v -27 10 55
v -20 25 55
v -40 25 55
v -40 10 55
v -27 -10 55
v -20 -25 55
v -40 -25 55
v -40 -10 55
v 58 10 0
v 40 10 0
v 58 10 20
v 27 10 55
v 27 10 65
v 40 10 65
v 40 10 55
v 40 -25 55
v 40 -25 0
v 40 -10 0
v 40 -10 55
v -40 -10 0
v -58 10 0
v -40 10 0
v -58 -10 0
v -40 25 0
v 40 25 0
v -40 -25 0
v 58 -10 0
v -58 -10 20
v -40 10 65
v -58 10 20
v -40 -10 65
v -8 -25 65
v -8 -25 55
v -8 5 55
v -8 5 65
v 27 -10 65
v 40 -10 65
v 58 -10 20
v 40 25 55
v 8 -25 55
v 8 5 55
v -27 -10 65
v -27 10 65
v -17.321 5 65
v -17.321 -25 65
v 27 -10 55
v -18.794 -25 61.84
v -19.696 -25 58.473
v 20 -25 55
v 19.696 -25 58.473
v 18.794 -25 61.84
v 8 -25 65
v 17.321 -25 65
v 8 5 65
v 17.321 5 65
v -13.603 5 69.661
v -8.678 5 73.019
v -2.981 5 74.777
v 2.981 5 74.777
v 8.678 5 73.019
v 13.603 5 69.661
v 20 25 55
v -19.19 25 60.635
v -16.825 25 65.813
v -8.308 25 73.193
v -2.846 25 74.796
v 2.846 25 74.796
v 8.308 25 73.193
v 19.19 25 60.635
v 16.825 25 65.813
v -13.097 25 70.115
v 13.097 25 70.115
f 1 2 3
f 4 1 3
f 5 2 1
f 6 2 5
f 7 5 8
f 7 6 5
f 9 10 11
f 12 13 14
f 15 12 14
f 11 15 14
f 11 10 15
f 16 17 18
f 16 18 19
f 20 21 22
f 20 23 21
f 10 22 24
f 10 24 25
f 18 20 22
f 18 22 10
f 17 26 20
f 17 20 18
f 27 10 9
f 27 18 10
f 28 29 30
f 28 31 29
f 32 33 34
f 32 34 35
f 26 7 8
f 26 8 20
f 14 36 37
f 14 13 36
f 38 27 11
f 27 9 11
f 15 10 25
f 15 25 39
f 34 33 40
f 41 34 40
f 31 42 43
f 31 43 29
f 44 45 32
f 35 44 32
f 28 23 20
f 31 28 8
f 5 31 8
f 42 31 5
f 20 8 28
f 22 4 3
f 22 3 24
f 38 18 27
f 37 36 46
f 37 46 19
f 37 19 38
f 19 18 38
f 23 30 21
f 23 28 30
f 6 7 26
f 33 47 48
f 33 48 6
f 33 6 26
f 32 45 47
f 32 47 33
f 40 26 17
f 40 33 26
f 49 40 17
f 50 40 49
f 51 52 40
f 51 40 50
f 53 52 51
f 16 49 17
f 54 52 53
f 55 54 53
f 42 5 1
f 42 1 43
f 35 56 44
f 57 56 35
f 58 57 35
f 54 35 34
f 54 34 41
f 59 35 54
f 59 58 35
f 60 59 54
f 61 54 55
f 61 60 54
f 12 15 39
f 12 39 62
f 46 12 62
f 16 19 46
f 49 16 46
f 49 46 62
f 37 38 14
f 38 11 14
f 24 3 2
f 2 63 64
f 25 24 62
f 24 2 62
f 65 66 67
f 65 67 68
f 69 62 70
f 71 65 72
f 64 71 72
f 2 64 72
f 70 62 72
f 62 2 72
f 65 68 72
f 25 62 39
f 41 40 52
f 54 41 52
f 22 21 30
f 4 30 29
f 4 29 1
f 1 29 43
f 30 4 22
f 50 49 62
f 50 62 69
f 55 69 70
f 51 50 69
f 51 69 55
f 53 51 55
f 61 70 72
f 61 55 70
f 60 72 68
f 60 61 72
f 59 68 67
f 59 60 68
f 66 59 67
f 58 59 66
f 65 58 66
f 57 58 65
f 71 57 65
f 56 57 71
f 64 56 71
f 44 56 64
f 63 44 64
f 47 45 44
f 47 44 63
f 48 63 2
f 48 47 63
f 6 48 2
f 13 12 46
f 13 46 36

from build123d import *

# Parameters (mm, degrees)
F1_DEPTH      = 25
F1_DEPTH_BACK = 25
F2_W          = 8
F2_H          = 10
F3_DEPTH      = 30
F0_W          = 13
F0_H          = 10
F0_W_2        = 18
F0_H_2        = 20
F4_DEPTH      = 10
F4_DEPTH_BACK = 10


with BuildPart() as f1:
    # F0 (on Front) → F1 (new body, two sides)
    with BuildSketch(Plane.XZ) as f1_sk:
        with BuildLine():
            ThreePointArc((20, 55), (0, 75), (-20, 55))
            Line((-20, 55), (20, 55))
        make_face()
        with BuildLine():
            Line((20, 55), (-20, 55))
            ThreePointArc((-20, 55), (0, 35), (20, 55))
        make_face()
        with BuildLine():
            Line((-40, 55), (-40, 0))
            Line((-40, 0), (40, 0))
            Line((40, 0), (40, 20))
            Line((40, 20), (40, 55))
            Line((40, 55), (27, 55))
            Line((27, 55), (20, 55))
            ThreePointArc((20, 55), (0, 35), (-20, 55))
            Line((-20, 55), (-27, 55))
            Line((-27, 55), (-40, 55))
        make_face()
    extrude(amount=F1_DEPTH)
    extrude(f1_sk.sketch, amount=-F1_DEPTH_BACK)

    # F2 (on face) → F3 (cut)
    with BuildSketch(Plane.XZ.offset(25)):
        with BuildLine():
            Line((22.0221508968, 90.4806110974), (-22.9720887471, 90.4806110974))
            Line((-22.9720887471, 90.4806110974), (-22.9720887471, 65))
            Line((-22.9720887471, 65), (-17.3205080757, 65))
            ThreePointArc((-17.3205080757, 65), (0, 75), (17.3205080757, 65))
            Line((17.3205080757, 65), (22.0221508968, 65))
            Line((22.0221508968, 65), (22.0221508968, 90.4806110974))
        make_face()
        with BuildLine():
            ThreePointArc((17.3205080757, 65), (0, 75), (-17.3205080757, 65))
            Line((-17.3205080757, 65), (-8, 65))
            Line((-8, 65), (0, 65))
            Line((0, 65), (8, 65))
            Line((8, 65), (17.3205080757, 65))
        make_face()
        with Locations((4, 60)):
            Rectangle(F2_W, F2_H)
        with Locations((-4, 60)):
            Rectangle(F2_W, F2_H)
    extrude(amount=-F3_DEPTH, mode=Mode.SUBTRACT)

    # F0 (on Front) → F4 (join, two sides)
    with BuildSketch(Plane.XZ) as f4_sk:
        Polygon((-58, 0), (-40, 0), (-40, 55), (-27, 55), (-27, 65), (-40, 65), (-58, 20), align=None)
        Polygon((40, 55), (40, 20), (58, 20), (40, 65), align=None)
        with Locations((33.5, 60)):
            Rectangle(F0_W, F0_H)
        with Locations((49, 10)):
            Rectangle(F0_W_2, F0_H_2)
    extrude(amount=F4_DEPTH)
    extrude(f4_sk.sketch, amount=-F4_DEPTH_BACK)


solid = f1.part
